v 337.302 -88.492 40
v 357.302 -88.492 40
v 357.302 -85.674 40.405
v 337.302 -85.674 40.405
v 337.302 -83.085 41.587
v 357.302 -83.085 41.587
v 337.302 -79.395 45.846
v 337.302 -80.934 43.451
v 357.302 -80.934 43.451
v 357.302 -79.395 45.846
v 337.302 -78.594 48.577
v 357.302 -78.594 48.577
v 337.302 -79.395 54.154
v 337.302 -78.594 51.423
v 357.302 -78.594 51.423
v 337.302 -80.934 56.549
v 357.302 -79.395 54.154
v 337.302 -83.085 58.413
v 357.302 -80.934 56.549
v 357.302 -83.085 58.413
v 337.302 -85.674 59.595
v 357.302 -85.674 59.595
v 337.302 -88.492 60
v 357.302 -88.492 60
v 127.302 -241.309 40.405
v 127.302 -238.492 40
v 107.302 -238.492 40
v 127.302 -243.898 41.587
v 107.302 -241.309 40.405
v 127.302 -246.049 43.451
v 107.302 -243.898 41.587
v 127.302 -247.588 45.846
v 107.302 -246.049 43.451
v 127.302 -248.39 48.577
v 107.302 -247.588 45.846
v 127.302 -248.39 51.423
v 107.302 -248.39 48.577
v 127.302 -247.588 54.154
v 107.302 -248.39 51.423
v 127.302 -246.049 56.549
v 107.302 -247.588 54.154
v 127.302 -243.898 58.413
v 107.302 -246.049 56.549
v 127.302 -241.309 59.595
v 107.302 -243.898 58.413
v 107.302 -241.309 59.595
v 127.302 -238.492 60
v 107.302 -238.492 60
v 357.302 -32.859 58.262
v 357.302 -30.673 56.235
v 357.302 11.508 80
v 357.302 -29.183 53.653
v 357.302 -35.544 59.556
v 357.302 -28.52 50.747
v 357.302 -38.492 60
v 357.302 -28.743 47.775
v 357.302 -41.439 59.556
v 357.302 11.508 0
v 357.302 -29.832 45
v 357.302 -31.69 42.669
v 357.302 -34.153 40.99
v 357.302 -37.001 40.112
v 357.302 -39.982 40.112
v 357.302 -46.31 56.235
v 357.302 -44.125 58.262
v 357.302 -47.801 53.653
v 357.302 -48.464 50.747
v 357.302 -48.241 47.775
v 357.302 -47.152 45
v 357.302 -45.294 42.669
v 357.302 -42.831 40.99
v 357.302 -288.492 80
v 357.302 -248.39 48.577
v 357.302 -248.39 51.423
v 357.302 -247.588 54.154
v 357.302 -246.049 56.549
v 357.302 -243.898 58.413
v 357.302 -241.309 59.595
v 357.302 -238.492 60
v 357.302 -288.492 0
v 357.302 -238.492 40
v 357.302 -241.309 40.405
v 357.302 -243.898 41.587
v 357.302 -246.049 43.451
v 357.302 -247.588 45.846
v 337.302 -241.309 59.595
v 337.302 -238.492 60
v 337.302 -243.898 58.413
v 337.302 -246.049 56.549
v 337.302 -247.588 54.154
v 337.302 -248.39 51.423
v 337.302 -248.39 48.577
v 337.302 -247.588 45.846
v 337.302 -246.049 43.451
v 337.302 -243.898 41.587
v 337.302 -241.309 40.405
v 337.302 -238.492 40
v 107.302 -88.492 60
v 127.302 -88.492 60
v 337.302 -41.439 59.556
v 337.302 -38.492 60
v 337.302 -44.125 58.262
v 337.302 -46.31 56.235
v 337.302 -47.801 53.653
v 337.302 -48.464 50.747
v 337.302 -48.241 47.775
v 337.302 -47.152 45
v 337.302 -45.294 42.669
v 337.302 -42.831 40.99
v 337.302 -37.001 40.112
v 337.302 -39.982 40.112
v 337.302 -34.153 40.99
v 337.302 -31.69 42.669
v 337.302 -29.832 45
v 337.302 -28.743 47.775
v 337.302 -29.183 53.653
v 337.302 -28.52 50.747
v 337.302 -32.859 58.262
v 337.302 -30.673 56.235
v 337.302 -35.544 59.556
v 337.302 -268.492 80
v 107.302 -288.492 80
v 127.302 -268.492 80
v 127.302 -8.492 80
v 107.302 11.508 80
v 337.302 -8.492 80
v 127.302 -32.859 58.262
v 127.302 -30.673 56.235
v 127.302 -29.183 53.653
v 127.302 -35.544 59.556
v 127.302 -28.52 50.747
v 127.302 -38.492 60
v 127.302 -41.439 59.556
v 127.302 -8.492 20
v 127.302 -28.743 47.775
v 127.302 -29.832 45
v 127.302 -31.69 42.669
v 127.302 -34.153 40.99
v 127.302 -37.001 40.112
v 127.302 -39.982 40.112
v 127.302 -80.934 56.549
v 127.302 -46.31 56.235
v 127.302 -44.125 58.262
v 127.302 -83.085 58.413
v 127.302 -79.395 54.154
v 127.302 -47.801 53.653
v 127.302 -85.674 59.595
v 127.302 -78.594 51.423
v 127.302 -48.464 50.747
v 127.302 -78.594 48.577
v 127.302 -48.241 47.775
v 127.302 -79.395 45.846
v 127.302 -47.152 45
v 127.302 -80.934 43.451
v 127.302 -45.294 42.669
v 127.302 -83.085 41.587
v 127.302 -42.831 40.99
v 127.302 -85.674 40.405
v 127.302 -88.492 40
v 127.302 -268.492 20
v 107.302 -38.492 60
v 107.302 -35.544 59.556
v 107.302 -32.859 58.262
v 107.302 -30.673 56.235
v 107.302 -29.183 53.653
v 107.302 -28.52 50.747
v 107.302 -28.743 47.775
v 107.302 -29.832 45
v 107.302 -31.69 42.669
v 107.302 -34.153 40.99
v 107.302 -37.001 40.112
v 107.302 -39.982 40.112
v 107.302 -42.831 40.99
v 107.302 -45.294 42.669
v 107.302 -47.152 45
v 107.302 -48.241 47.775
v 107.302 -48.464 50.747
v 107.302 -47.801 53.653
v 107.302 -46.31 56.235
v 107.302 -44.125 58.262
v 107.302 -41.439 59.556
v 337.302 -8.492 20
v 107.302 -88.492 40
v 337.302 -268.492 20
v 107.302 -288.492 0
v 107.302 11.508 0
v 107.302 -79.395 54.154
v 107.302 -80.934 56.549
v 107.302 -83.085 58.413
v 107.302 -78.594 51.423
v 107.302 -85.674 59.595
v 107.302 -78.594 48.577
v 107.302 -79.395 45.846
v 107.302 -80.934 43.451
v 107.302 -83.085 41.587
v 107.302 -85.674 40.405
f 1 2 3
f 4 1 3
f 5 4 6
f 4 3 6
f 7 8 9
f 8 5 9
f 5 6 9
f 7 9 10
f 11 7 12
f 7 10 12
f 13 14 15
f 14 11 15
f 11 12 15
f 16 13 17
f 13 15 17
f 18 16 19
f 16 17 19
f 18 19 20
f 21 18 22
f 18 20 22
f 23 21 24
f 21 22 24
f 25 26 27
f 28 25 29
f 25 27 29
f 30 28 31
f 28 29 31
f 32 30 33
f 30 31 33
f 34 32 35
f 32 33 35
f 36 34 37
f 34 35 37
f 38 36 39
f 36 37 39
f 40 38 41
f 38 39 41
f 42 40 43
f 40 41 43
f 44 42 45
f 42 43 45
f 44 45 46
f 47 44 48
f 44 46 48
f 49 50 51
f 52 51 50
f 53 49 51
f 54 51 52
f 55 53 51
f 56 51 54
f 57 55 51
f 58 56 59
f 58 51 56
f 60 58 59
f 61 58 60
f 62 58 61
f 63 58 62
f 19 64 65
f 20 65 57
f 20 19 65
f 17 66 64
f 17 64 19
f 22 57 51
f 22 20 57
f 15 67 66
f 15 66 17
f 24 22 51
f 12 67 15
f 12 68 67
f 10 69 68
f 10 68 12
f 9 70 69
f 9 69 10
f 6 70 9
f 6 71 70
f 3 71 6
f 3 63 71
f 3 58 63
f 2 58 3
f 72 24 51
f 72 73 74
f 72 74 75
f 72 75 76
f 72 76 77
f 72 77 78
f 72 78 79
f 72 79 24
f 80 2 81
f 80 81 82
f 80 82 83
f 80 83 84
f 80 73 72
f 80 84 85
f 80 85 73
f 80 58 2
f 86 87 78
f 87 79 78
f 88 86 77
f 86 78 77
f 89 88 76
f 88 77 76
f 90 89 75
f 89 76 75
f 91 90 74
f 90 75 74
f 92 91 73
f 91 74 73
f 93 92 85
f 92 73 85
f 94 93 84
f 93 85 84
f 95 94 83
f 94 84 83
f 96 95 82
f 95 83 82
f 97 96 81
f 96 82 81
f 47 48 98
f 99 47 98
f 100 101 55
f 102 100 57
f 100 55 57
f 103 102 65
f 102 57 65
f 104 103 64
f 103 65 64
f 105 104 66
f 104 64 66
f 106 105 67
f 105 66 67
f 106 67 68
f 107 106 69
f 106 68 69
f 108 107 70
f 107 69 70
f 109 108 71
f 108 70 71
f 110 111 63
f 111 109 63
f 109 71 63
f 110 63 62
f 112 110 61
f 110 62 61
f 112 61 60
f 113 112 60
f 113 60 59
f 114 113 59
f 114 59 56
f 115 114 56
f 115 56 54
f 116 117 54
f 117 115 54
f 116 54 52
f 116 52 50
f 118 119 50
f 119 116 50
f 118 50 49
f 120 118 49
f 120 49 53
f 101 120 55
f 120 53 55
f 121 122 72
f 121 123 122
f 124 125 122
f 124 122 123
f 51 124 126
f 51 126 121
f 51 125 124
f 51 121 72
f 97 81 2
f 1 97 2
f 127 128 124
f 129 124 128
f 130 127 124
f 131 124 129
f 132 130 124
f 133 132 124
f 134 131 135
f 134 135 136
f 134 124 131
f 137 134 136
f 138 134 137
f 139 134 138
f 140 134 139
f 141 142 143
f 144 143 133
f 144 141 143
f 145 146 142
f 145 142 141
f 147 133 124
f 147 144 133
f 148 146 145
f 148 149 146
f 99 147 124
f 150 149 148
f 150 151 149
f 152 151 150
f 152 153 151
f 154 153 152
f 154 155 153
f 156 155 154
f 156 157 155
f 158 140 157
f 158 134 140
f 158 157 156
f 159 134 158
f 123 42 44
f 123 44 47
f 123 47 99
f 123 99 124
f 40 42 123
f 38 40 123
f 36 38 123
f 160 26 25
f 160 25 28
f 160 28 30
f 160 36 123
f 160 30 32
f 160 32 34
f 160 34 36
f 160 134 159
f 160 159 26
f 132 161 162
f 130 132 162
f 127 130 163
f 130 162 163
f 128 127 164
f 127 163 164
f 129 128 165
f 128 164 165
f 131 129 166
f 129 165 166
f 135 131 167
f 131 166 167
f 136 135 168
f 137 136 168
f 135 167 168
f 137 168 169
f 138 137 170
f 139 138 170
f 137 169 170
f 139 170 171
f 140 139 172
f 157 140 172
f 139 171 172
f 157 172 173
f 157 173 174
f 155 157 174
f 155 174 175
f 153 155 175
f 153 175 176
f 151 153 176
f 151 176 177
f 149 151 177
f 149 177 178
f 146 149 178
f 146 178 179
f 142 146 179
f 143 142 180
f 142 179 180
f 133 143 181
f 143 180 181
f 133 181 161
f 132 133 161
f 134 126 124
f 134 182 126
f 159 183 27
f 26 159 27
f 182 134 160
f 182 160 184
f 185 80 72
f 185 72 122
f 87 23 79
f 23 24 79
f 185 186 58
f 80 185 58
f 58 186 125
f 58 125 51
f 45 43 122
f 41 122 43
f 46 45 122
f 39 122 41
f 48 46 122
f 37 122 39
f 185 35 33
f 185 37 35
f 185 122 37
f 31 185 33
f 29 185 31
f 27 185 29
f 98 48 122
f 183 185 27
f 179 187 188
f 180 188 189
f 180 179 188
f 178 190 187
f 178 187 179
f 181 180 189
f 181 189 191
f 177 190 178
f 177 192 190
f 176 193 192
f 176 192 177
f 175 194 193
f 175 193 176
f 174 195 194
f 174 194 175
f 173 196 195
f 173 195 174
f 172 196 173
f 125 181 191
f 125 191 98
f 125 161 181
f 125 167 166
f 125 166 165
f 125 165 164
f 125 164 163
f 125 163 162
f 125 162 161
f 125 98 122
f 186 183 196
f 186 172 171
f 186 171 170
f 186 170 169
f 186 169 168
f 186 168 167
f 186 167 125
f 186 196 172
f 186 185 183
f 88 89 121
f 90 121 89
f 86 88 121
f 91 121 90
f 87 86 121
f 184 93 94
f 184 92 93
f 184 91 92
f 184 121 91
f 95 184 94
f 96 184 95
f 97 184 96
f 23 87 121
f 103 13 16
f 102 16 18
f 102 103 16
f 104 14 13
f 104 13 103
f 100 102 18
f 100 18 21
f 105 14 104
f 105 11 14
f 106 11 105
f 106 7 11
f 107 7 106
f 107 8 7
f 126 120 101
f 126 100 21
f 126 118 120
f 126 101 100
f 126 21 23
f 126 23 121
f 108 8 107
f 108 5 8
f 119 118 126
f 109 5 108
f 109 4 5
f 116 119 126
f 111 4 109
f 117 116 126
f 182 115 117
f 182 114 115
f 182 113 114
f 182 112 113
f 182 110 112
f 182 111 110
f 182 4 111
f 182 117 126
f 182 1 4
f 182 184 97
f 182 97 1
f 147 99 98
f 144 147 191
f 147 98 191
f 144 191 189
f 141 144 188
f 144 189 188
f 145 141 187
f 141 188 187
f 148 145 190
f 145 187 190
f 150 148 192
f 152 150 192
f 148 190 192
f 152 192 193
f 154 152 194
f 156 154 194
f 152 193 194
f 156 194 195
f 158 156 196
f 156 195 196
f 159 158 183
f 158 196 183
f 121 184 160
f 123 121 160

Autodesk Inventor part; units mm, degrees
ref_plane "YZ Plane" through (0, 0, 0) normal (1, 0, 0) x (0, 1, 0)
ref_plane "XZ Plane" through (0, 0, 0) normal (0, 1, 0) x (-1, 0, 0)
ref_plane "XY Plane" through (0, 0, 0) normal (0, 0, 1) x (1, 0, 0)
sketch "Szkic1" plane through (0, 0, 0) normal (0, 0, 1) x (1, 0, 0)
  line L0 (107.302, 11.5082) -> (232.302, 11.5082)
  line L1 (232.302, 11.5082) -> (232.302, -288.4918)
  line L2 (232.302, -288.4918) -> (107.302, -288.4918)
  line L3 (107.302, -288.4918) -> (107.302, 11.5082)
  point P0 (0, 0)
  dimension "d0" = 125
  dimension "d1" = 300
extrude "Wyciągnięcie proste1" add sketch "Szkic1" along normal blind 20
sketch "Szkic2" plane through (0, 0, 20) normal (0, 0, 1) x (1, 0, 0)
  line L0 (232.302, 11.5082) -> (107.302, 11.5082) projected
  line L1 (107.302, -288.4918) -> (232.302, -288.4918) projected
  line L2 (107.302, 11.5082) -> (127.302, 11.5082)
  line L3 (127.302, 11.5082) -> (127.302, -288.4918)
  line L4 (127.302, -288.4918) -> (107.302, -288.4918)
  line L5 (107.302, -288.4918) -> (107.302, 11.5082)
  line L6 (232.302, -288.4918) -> (232.302, 11.5082) projected
  line L7 (107.302, 11.5082) -> (232.302, 11.5082)
  line L8 (232.302, 11.5082) -> (232.302, -8.4918)
  line L9 (232.302, -8.4918) -> (107.302, -8.4918)
  line L10 (107.302, -8.4918) -> (107.302, 11.5082)
  line L11 (107.302, -288.4918) -> (232.302, -288.4918)
  line L12 (232.302, -288.4918) -> (232.302, -268.4918)
  line L13 (232.302, -268.4918) -> (107.302, -268.4918)
  line L14 (107.302, -268.4918) -> (107.302, -288.4918)
  point P0 (0, 0)
  point P1 (127.302, -8.4918)
  point P2 (127.302, -268.4918)
  dimension "d4" = 20
  dimension "d5" = 20
  dimension "d8" = 20
extrude "Wyciągnięcie proste2" add sketch "Szkic2" along normal blind 60 contours L6 L9 L3 L0 | L3 L9 L5 L0 | L3 L13 L5 L9 | L6 L1 L3 L13 | L3 L1 L5 L13
sketch "Szkic3" plane through (107.302, -288.4918, 0) normal (-1, 0, 0) x (0, 0, 1)
  line L0 (0, 300) -> (80, 300) projected
  line L1 (0, 0) -> (80, 0) projected
  line L2 (80, 300) -> (50, 300)
  line L3 (50, 300) -> (50, 0)
  line L4 (50, 0) -> (80, 0)
  line L5 (80, 0) -> (80, 300)
  circle A0 centre (50, 250) radius 10
  circle A1 centre (50, 200) radius 10
  circle A2 centre (50, 50) radius 10
  line L6 (50, 200) -> (50, 50) construction
  line L7 (40, 200) -> (40, 50)
  line L8 (60, 50) -> (60, 200)
  arc A3 (60, 200) -> (40, 200) centre (50, 200) ccw
  arc A4 (40, 50) -> (60, 50) centre (50, 50) ccw
  point P0 (0, 288.4918)
  point P1 (65, 300)
  point P2 (65, 0)
  point P3 (50, 125)
  point P4 (60, 200)
  dimension "d9" = 30
  dimension "d10" = 50
  dimension "d11" = 50
  dimension "d12" = 100
  dimension "d13" = 20
  dimension "d14" = 20
  dimension "d15" = 20
extrude "Wyciągnięcie proste3" cut sketch "Szkic3" against normal through all contours A0 L3 | L3 A0 | A1 L3 | L3 A1 | A2 L3 | L3 A2 | A1 L8 A2 L3 | L3 A2 L7 A1
mirror "Odbij1" about plane through (232.302, -288.4918, 0) normal (1, 0, 0)
properties part number "podstawa"
